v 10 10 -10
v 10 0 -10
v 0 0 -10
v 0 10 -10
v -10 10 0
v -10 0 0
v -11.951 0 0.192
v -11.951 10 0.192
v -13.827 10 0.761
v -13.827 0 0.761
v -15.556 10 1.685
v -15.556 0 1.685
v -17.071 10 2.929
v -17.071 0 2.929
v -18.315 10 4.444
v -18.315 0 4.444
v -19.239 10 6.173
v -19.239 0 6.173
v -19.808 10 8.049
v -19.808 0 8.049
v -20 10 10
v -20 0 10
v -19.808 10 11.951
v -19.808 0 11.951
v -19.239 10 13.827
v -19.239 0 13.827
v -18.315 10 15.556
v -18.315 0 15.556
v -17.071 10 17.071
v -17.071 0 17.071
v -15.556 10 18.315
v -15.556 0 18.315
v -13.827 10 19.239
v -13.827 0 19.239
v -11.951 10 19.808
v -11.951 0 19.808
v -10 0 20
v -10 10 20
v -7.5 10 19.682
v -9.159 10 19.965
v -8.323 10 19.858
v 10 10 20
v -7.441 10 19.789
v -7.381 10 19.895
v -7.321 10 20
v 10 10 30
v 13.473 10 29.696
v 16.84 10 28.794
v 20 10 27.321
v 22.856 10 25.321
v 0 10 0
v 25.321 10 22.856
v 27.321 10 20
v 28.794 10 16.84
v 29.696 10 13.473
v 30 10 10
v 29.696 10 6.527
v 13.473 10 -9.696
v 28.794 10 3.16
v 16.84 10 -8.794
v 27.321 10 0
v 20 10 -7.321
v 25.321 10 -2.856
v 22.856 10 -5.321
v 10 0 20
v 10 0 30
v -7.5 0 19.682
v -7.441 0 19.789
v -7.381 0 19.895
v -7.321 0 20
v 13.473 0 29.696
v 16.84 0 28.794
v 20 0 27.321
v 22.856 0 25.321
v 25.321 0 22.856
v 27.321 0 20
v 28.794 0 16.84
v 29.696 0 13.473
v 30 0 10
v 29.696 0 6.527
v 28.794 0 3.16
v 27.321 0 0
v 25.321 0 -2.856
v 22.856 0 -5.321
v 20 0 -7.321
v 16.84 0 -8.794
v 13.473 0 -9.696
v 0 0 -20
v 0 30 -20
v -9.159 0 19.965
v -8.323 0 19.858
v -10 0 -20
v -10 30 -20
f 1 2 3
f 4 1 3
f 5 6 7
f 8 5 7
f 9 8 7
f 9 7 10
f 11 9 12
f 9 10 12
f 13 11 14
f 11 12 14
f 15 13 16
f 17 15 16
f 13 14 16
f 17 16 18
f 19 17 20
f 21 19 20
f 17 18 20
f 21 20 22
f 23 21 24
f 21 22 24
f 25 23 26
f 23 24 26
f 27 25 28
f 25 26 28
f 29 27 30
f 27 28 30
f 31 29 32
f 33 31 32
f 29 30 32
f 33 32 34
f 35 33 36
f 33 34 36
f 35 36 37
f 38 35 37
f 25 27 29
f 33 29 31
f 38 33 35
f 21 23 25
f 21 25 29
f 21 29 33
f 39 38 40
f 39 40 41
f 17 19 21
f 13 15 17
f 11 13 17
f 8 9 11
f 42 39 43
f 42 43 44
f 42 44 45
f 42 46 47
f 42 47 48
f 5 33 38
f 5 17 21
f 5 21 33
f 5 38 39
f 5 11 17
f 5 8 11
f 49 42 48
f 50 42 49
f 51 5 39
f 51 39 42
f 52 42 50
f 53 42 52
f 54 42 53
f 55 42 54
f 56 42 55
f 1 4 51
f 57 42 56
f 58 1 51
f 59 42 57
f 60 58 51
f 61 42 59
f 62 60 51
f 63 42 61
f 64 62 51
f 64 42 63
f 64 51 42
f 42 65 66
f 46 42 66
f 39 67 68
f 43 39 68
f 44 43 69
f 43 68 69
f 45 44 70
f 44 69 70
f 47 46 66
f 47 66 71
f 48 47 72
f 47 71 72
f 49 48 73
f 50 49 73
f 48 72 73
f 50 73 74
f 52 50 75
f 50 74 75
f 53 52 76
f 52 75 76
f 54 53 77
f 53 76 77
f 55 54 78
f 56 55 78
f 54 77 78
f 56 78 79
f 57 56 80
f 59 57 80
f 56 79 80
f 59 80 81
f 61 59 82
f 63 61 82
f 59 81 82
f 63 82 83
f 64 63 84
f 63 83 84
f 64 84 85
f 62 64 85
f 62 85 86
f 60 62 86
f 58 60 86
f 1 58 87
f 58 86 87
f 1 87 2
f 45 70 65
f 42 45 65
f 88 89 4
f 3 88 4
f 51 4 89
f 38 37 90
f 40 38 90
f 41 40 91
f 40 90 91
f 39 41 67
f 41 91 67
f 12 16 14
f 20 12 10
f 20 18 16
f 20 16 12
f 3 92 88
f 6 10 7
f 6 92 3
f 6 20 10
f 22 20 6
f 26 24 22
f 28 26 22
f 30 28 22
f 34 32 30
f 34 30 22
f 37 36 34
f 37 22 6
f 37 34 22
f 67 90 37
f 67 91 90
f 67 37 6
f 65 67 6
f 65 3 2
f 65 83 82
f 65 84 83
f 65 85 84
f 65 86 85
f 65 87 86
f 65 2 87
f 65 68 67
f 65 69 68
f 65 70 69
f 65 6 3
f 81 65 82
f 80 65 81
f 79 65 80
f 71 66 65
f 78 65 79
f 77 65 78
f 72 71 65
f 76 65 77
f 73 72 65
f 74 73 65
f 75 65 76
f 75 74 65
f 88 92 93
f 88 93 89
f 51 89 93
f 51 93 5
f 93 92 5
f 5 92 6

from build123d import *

# Parameters (mm, degrees)
EXTRUDE_1_DEPTH     = 10
SKETCH_2_W          = 10
SKETCH_2_H          = 20
EXTRUDE_2_DEPTH     = 30
CUT_EXTRUDE_1_DEPTH = 30


with BuildPart() as part:
    # 草圖1 → 填料-伸長1 (new body)
    with BuildSketch(Plane(origin=(0, 0, 0), x_dir=(1, 0, 0), z_dir=(0, 1, 0))):
        with BuildLine():
            Line((0, 10), (0, 0))
            Line((0, 0), (-10, 0))
            Line((-10, 0), (-10, -20))
            ThreePointArc((-10, -20), (-8.739957075, -19.920296963), (-7.5, -19.682458366))
            ThreePointArc((-7.5, -19.682458366), (-7.410977969, -19.841638388), (-7.320508076, -20))
            Line((-7.320508076, -20), (10, -20))
            Line((10, -20), (10, 10))
            Line((10, 10), (0, 10))
        make_face()
        with BuildLine():
            Line((-10, -20), (-10, 0))
            ThreePointArc((-10, 0), (-20, -10), (-10, -20))
        make_face()
        with BuildLine():
            Line((10, -20), (10, -30))
            ThreePointArc((10, -30), (30, -10), (10, 10))
            Line((10, 10), (10, -20))
        make_face()
    extrude(amount=EXTRUDE_1_DEPTH)

    # 草圖2 → 填料-伸長2 (add)
    with BuildSketch(Plane.XZ):
        with Locations((-5, -10)):
            Rectangle(SKETCH_2_W, SKETCH_2_H)
    extrude(amount=-EXTRUDE_2_DEPTH)

    # 草圖3 → 除料-伸長1 (cut)
    with BuildSketch(Plane(origin=(0, 0, 0), x_dir=(0, 0, -1), z_dir=(1, 0, 0))):
        Polygon((20, 30), (0, 10), (0, 30), align=None)
    extrude(amount=-CUT_EXTRUDE_1_DEPTH, mode=Mode.SUBTRACT)


solid = part.part
